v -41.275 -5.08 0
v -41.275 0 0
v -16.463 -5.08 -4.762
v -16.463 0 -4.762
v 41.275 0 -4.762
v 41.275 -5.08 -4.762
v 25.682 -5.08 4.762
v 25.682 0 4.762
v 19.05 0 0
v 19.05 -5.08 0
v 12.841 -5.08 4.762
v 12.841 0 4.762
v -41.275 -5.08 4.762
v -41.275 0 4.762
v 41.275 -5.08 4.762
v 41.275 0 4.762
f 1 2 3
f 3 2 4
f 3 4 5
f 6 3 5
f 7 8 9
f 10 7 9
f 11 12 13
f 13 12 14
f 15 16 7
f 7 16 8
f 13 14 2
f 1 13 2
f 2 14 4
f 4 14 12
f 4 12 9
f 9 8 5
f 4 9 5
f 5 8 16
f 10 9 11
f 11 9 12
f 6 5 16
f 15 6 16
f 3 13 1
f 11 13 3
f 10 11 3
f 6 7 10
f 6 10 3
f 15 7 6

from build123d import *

# Parameters (mm, degrees)
F1_DEPTH = 5.08


with BuildPart() as f1:
    # F0 (on Front) → F1 (new body)
    with BuildSketch(Plane.XZ):
        Polygon((-16.462963, -4.7625), (41.275, -4.7625), (41.275, 0), (19.05, 0), (12.84111, 4.7625), (-41.275, 4.7625), (-41.275, 0), align=None)
        Polygon((19.05, 0), (41.275, 0), (41.275, 4.7625), (25.682222, 4.7625), align=None)
    extrude(amount=F1_DEPTH)


solid = f1.part
